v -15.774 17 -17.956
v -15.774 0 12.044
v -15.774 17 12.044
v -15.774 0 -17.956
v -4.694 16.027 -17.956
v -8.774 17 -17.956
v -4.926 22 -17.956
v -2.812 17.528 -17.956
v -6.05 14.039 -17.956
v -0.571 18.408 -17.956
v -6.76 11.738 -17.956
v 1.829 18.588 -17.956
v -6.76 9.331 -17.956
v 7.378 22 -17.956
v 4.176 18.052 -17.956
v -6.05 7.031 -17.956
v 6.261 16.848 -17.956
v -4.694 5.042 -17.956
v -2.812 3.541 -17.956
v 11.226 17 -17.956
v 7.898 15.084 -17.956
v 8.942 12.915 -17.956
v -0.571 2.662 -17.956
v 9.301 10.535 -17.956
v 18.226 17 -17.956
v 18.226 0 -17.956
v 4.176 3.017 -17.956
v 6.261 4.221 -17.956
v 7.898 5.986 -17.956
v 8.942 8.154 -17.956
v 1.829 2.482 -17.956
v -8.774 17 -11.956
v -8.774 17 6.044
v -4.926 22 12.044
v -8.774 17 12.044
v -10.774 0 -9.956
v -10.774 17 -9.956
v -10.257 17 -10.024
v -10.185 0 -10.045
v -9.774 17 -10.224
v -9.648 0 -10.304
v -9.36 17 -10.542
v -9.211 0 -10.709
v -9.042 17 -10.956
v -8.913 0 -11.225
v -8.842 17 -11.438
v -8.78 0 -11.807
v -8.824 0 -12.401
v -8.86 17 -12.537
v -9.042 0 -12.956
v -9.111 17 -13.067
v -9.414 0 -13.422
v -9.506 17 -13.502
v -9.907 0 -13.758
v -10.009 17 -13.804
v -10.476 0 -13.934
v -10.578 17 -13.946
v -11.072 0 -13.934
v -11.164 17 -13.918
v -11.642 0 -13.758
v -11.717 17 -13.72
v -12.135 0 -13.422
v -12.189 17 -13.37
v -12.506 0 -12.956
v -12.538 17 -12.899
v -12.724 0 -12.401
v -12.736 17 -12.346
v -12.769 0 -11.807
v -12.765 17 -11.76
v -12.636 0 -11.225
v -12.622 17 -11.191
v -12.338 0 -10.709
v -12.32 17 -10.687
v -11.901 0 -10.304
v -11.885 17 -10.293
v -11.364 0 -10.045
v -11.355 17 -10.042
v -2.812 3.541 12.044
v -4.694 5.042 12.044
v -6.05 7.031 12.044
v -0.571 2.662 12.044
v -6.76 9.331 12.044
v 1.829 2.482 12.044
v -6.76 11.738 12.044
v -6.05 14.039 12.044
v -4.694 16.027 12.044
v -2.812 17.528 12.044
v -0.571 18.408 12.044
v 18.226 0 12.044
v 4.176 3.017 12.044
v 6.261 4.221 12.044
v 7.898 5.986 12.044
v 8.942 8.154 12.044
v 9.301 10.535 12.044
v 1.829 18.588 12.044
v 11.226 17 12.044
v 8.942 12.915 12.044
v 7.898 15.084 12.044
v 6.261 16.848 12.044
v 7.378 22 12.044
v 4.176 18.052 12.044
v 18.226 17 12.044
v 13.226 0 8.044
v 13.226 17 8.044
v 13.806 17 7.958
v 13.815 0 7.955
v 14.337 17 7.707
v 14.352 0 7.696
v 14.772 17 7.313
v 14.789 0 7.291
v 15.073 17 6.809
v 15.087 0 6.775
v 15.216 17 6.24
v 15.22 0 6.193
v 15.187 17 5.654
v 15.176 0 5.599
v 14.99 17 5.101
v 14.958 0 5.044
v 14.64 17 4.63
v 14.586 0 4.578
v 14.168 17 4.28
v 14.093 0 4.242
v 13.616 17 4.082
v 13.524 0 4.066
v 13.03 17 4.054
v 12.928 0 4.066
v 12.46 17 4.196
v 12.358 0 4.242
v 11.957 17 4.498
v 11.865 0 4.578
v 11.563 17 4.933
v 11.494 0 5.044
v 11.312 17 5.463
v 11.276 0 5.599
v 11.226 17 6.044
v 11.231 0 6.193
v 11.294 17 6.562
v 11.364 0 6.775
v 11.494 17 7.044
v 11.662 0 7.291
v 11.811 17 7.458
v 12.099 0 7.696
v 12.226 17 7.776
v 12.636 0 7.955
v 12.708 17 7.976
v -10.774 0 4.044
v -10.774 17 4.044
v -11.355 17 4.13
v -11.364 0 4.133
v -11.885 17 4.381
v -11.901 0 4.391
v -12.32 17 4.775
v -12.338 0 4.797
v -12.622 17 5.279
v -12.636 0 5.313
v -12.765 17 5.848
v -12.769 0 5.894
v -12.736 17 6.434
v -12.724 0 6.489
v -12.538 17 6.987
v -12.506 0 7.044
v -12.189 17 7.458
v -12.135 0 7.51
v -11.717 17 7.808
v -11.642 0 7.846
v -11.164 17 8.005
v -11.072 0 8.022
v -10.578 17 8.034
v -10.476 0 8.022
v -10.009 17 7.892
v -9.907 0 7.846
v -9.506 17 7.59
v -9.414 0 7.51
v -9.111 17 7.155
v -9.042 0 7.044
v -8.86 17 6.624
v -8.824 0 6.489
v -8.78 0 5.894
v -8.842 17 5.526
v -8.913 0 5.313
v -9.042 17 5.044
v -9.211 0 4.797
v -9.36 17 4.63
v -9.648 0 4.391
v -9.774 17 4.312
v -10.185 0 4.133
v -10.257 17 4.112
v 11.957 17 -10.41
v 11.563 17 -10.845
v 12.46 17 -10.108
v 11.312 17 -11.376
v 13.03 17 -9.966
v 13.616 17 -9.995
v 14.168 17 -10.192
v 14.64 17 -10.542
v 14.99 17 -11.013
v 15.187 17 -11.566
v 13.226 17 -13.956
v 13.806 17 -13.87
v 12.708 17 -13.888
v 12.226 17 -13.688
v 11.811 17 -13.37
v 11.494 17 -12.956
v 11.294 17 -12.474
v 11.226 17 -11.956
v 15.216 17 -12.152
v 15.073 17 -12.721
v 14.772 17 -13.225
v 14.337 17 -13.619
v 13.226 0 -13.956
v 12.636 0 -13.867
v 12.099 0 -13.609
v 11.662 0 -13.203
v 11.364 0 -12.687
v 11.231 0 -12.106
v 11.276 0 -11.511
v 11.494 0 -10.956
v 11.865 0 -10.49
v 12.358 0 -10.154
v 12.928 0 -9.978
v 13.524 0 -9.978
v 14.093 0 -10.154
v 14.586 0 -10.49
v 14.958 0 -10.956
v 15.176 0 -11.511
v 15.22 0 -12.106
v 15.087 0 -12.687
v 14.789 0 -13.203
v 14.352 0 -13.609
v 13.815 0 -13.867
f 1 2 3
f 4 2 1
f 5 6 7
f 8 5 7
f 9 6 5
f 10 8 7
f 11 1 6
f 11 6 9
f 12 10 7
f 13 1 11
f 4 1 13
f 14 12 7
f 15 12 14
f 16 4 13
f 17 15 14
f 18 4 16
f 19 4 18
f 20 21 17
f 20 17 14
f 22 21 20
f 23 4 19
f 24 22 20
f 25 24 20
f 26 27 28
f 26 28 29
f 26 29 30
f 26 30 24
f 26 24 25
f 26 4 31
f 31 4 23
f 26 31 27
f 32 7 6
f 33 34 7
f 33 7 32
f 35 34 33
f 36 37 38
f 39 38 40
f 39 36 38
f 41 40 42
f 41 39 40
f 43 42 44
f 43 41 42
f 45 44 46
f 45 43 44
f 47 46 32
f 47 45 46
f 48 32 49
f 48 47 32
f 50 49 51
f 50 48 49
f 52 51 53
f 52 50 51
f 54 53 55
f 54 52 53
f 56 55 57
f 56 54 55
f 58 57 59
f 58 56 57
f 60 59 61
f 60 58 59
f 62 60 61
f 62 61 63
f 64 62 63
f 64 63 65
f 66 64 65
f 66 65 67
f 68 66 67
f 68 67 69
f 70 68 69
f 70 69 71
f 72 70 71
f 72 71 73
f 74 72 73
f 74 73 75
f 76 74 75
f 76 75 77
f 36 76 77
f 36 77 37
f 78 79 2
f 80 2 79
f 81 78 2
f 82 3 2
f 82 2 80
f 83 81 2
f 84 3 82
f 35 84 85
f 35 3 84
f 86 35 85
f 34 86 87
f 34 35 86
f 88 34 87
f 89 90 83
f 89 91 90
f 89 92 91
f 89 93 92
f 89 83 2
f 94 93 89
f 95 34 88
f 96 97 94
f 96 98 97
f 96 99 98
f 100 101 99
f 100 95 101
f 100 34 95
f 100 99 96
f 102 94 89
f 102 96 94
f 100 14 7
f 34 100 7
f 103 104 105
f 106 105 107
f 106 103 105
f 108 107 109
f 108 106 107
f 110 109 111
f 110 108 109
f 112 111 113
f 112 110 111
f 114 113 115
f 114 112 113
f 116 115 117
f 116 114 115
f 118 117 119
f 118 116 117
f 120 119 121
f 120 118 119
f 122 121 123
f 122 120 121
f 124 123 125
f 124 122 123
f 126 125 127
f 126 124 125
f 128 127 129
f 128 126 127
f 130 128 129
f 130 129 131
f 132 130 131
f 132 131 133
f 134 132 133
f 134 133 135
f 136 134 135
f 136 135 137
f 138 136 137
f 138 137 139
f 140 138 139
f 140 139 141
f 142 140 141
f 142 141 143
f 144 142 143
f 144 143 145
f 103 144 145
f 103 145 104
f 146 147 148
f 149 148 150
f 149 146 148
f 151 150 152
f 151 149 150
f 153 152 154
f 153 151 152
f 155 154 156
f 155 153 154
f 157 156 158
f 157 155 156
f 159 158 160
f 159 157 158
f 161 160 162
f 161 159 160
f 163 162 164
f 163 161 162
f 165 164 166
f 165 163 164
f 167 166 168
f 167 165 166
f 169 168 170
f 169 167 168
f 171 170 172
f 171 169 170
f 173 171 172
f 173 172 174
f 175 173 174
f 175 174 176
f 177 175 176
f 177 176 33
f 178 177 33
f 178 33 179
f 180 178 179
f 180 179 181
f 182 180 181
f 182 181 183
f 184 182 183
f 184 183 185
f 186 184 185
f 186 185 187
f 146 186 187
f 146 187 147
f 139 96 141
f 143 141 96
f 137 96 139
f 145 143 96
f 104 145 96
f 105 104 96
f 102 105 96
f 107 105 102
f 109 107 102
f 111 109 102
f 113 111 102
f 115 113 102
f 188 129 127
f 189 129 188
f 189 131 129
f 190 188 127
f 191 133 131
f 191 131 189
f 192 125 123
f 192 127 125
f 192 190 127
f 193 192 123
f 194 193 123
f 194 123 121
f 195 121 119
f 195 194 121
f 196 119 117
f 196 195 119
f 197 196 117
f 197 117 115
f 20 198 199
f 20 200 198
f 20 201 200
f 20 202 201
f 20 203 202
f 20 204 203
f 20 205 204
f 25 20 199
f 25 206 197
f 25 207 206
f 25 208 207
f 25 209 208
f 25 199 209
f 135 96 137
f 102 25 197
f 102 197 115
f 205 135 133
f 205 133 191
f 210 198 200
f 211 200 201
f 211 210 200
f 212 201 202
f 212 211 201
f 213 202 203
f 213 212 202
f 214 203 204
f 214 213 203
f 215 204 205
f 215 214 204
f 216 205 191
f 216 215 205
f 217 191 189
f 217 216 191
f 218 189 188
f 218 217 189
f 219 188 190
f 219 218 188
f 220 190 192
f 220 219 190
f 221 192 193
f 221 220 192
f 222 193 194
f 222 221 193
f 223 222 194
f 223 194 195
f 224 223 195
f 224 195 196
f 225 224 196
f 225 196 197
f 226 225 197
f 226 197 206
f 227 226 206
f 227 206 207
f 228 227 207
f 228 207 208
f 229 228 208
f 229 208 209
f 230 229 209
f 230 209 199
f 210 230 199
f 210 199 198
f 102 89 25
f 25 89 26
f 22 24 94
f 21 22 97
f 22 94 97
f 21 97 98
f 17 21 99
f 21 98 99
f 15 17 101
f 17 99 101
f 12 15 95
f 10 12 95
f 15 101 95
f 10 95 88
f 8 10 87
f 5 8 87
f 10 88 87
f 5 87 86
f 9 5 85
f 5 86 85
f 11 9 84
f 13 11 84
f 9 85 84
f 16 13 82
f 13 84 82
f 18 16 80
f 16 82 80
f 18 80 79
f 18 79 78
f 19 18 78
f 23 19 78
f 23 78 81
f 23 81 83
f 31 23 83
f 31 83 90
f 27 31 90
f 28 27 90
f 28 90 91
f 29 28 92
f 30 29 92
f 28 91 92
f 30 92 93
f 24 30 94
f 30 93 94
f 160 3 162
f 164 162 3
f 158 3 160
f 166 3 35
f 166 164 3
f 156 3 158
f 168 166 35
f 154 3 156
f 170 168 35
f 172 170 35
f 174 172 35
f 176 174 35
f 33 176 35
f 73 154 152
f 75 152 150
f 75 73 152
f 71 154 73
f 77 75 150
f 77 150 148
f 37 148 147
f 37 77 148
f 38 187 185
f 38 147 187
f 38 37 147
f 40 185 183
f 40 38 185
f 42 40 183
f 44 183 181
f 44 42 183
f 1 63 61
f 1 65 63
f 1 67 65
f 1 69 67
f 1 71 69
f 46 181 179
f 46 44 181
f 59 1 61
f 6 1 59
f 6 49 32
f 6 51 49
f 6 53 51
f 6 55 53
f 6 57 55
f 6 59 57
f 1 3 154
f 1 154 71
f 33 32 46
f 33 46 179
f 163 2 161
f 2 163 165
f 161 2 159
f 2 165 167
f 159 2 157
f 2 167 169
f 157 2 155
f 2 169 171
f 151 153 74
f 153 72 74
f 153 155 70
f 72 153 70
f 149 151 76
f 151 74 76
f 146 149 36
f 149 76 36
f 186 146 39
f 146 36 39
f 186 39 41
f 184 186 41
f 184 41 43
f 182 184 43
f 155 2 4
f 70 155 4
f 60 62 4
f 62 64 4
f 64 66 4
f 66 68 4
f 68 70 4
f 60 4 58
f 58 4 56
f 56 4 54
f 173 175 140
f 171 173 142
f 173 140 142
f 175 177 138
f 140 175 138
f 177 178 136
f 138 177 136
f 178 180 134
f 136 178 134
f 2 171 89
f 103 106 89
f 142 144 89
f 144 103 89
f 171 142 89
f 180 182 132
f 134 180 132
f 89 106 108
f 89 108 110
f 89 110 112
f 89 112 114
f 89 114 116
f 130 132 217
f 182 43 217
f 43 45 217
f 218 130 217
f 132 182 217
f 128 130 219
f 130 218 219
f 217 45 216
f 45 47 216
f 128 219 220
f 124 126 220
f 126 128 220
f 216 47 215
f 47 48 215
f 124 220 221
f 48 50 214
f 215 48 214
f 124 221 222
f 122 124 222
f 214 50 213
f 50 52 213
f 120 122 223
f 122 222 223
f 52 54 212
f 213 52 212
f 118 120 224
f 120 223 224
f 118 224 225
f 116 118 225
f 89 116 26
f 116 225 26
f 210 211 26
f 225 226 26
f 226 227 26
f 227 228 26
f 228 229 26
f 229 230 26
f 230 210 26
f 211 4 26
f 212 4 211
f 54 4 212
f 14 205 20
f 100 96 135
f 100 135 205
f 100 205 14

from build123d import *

# Parameters (mm, degrees)
SKETCH_1_W          = 34
SKETCH_1_H          = 30
SKETCH_1_R          = 2
EXTRUDE_1_DEPTH     = 17
EXTRUDE_3_REACH     = 41.002
SKETCH_4_R          = 8.07551033
CUT_EXTRUDE_1_DEPTH = 30


with BuildPart() as part:
    # 草图1 → 凸台-拉伸1 (new body)
    with BuildSketch(Plane(origin=(0, 0, 0), x_dir=(1, 0, 0), z_dir=(0, 1, 0))):
        with Locations((1.225705329, 2.956112853)):
            Rectangle(SKETCH_1_W, SKETCH_1_H)
        with Locations(Location((-10.774294671, 11.956112853, 0), (0, 0, 270))):
            Circle(SKETCH_1_R, mode=Mode.SUBTRACT)
        with Locations(Location((13.225705329, 11.956112853, 0), (0, 0, 90))):
            Circle(SKETCH_1_R, mode=Mode.SUBTRACT)
        with Locations(Location((13.225705329, -6.043887147, 0), (0, 0, 270))):
            Circle(SKETCH_1_R, mode=Mode.SUBTRACT)
        with Locations(Location((-10.774294671, -6.043887147, 0), (0, 0, 90))):
            Circle(SKETCH_1_R, mode=Mode.SUBTRACT)
    extrude(amount=EXTRUDE_1_DEPTH)

    # 凸台-拉伸3: up to this face of the body (flat: up to its plane)
    extrude_3_end = Plane(part.part.faces().sort_by_distance((1.225705329, 8.5, -17.956112853))[0])
    # 草图3 → 凸台-拉伸3 (add, up to the picked face)
    with BuildSketch(Plane.XY.offset(12.043887147), mode=Mode.PRIVATE) as extrude_3_sk1:
        Polygon((-4.926354977, 22), (-8.774294671, 17), (1.225705329, 17), (11.225705329, 17), (7.377765635, 22), align=None)
    extrude_3_tool1 = split(extrude(extrude_3_sk1.sketch, amount=-EXTRUDE_3_REACH, mode=Mode.PRIVATE), bisect_by=extrude_3_end, keep=Keep.BOTH, mode=Mode.PRIVATE)
    add(extrude_3_tool1.solids().sort_by(Axis((1.225705, 19.301473, 12.043887), (0, 0, -1)))[0])

    # 草图4 → 切除-拉伸1 (cut)
    with BuildSketch(Plane.XY.offset(12.043887147)):
        with Locations((1.225705329, 10.534716584)):
            Circle(SKETCH_4_R)
    extrude(amount=-CUT_EXTRUDE_1_DEPTH, mode=Mode.SUBTRACT)


solid = part.part
